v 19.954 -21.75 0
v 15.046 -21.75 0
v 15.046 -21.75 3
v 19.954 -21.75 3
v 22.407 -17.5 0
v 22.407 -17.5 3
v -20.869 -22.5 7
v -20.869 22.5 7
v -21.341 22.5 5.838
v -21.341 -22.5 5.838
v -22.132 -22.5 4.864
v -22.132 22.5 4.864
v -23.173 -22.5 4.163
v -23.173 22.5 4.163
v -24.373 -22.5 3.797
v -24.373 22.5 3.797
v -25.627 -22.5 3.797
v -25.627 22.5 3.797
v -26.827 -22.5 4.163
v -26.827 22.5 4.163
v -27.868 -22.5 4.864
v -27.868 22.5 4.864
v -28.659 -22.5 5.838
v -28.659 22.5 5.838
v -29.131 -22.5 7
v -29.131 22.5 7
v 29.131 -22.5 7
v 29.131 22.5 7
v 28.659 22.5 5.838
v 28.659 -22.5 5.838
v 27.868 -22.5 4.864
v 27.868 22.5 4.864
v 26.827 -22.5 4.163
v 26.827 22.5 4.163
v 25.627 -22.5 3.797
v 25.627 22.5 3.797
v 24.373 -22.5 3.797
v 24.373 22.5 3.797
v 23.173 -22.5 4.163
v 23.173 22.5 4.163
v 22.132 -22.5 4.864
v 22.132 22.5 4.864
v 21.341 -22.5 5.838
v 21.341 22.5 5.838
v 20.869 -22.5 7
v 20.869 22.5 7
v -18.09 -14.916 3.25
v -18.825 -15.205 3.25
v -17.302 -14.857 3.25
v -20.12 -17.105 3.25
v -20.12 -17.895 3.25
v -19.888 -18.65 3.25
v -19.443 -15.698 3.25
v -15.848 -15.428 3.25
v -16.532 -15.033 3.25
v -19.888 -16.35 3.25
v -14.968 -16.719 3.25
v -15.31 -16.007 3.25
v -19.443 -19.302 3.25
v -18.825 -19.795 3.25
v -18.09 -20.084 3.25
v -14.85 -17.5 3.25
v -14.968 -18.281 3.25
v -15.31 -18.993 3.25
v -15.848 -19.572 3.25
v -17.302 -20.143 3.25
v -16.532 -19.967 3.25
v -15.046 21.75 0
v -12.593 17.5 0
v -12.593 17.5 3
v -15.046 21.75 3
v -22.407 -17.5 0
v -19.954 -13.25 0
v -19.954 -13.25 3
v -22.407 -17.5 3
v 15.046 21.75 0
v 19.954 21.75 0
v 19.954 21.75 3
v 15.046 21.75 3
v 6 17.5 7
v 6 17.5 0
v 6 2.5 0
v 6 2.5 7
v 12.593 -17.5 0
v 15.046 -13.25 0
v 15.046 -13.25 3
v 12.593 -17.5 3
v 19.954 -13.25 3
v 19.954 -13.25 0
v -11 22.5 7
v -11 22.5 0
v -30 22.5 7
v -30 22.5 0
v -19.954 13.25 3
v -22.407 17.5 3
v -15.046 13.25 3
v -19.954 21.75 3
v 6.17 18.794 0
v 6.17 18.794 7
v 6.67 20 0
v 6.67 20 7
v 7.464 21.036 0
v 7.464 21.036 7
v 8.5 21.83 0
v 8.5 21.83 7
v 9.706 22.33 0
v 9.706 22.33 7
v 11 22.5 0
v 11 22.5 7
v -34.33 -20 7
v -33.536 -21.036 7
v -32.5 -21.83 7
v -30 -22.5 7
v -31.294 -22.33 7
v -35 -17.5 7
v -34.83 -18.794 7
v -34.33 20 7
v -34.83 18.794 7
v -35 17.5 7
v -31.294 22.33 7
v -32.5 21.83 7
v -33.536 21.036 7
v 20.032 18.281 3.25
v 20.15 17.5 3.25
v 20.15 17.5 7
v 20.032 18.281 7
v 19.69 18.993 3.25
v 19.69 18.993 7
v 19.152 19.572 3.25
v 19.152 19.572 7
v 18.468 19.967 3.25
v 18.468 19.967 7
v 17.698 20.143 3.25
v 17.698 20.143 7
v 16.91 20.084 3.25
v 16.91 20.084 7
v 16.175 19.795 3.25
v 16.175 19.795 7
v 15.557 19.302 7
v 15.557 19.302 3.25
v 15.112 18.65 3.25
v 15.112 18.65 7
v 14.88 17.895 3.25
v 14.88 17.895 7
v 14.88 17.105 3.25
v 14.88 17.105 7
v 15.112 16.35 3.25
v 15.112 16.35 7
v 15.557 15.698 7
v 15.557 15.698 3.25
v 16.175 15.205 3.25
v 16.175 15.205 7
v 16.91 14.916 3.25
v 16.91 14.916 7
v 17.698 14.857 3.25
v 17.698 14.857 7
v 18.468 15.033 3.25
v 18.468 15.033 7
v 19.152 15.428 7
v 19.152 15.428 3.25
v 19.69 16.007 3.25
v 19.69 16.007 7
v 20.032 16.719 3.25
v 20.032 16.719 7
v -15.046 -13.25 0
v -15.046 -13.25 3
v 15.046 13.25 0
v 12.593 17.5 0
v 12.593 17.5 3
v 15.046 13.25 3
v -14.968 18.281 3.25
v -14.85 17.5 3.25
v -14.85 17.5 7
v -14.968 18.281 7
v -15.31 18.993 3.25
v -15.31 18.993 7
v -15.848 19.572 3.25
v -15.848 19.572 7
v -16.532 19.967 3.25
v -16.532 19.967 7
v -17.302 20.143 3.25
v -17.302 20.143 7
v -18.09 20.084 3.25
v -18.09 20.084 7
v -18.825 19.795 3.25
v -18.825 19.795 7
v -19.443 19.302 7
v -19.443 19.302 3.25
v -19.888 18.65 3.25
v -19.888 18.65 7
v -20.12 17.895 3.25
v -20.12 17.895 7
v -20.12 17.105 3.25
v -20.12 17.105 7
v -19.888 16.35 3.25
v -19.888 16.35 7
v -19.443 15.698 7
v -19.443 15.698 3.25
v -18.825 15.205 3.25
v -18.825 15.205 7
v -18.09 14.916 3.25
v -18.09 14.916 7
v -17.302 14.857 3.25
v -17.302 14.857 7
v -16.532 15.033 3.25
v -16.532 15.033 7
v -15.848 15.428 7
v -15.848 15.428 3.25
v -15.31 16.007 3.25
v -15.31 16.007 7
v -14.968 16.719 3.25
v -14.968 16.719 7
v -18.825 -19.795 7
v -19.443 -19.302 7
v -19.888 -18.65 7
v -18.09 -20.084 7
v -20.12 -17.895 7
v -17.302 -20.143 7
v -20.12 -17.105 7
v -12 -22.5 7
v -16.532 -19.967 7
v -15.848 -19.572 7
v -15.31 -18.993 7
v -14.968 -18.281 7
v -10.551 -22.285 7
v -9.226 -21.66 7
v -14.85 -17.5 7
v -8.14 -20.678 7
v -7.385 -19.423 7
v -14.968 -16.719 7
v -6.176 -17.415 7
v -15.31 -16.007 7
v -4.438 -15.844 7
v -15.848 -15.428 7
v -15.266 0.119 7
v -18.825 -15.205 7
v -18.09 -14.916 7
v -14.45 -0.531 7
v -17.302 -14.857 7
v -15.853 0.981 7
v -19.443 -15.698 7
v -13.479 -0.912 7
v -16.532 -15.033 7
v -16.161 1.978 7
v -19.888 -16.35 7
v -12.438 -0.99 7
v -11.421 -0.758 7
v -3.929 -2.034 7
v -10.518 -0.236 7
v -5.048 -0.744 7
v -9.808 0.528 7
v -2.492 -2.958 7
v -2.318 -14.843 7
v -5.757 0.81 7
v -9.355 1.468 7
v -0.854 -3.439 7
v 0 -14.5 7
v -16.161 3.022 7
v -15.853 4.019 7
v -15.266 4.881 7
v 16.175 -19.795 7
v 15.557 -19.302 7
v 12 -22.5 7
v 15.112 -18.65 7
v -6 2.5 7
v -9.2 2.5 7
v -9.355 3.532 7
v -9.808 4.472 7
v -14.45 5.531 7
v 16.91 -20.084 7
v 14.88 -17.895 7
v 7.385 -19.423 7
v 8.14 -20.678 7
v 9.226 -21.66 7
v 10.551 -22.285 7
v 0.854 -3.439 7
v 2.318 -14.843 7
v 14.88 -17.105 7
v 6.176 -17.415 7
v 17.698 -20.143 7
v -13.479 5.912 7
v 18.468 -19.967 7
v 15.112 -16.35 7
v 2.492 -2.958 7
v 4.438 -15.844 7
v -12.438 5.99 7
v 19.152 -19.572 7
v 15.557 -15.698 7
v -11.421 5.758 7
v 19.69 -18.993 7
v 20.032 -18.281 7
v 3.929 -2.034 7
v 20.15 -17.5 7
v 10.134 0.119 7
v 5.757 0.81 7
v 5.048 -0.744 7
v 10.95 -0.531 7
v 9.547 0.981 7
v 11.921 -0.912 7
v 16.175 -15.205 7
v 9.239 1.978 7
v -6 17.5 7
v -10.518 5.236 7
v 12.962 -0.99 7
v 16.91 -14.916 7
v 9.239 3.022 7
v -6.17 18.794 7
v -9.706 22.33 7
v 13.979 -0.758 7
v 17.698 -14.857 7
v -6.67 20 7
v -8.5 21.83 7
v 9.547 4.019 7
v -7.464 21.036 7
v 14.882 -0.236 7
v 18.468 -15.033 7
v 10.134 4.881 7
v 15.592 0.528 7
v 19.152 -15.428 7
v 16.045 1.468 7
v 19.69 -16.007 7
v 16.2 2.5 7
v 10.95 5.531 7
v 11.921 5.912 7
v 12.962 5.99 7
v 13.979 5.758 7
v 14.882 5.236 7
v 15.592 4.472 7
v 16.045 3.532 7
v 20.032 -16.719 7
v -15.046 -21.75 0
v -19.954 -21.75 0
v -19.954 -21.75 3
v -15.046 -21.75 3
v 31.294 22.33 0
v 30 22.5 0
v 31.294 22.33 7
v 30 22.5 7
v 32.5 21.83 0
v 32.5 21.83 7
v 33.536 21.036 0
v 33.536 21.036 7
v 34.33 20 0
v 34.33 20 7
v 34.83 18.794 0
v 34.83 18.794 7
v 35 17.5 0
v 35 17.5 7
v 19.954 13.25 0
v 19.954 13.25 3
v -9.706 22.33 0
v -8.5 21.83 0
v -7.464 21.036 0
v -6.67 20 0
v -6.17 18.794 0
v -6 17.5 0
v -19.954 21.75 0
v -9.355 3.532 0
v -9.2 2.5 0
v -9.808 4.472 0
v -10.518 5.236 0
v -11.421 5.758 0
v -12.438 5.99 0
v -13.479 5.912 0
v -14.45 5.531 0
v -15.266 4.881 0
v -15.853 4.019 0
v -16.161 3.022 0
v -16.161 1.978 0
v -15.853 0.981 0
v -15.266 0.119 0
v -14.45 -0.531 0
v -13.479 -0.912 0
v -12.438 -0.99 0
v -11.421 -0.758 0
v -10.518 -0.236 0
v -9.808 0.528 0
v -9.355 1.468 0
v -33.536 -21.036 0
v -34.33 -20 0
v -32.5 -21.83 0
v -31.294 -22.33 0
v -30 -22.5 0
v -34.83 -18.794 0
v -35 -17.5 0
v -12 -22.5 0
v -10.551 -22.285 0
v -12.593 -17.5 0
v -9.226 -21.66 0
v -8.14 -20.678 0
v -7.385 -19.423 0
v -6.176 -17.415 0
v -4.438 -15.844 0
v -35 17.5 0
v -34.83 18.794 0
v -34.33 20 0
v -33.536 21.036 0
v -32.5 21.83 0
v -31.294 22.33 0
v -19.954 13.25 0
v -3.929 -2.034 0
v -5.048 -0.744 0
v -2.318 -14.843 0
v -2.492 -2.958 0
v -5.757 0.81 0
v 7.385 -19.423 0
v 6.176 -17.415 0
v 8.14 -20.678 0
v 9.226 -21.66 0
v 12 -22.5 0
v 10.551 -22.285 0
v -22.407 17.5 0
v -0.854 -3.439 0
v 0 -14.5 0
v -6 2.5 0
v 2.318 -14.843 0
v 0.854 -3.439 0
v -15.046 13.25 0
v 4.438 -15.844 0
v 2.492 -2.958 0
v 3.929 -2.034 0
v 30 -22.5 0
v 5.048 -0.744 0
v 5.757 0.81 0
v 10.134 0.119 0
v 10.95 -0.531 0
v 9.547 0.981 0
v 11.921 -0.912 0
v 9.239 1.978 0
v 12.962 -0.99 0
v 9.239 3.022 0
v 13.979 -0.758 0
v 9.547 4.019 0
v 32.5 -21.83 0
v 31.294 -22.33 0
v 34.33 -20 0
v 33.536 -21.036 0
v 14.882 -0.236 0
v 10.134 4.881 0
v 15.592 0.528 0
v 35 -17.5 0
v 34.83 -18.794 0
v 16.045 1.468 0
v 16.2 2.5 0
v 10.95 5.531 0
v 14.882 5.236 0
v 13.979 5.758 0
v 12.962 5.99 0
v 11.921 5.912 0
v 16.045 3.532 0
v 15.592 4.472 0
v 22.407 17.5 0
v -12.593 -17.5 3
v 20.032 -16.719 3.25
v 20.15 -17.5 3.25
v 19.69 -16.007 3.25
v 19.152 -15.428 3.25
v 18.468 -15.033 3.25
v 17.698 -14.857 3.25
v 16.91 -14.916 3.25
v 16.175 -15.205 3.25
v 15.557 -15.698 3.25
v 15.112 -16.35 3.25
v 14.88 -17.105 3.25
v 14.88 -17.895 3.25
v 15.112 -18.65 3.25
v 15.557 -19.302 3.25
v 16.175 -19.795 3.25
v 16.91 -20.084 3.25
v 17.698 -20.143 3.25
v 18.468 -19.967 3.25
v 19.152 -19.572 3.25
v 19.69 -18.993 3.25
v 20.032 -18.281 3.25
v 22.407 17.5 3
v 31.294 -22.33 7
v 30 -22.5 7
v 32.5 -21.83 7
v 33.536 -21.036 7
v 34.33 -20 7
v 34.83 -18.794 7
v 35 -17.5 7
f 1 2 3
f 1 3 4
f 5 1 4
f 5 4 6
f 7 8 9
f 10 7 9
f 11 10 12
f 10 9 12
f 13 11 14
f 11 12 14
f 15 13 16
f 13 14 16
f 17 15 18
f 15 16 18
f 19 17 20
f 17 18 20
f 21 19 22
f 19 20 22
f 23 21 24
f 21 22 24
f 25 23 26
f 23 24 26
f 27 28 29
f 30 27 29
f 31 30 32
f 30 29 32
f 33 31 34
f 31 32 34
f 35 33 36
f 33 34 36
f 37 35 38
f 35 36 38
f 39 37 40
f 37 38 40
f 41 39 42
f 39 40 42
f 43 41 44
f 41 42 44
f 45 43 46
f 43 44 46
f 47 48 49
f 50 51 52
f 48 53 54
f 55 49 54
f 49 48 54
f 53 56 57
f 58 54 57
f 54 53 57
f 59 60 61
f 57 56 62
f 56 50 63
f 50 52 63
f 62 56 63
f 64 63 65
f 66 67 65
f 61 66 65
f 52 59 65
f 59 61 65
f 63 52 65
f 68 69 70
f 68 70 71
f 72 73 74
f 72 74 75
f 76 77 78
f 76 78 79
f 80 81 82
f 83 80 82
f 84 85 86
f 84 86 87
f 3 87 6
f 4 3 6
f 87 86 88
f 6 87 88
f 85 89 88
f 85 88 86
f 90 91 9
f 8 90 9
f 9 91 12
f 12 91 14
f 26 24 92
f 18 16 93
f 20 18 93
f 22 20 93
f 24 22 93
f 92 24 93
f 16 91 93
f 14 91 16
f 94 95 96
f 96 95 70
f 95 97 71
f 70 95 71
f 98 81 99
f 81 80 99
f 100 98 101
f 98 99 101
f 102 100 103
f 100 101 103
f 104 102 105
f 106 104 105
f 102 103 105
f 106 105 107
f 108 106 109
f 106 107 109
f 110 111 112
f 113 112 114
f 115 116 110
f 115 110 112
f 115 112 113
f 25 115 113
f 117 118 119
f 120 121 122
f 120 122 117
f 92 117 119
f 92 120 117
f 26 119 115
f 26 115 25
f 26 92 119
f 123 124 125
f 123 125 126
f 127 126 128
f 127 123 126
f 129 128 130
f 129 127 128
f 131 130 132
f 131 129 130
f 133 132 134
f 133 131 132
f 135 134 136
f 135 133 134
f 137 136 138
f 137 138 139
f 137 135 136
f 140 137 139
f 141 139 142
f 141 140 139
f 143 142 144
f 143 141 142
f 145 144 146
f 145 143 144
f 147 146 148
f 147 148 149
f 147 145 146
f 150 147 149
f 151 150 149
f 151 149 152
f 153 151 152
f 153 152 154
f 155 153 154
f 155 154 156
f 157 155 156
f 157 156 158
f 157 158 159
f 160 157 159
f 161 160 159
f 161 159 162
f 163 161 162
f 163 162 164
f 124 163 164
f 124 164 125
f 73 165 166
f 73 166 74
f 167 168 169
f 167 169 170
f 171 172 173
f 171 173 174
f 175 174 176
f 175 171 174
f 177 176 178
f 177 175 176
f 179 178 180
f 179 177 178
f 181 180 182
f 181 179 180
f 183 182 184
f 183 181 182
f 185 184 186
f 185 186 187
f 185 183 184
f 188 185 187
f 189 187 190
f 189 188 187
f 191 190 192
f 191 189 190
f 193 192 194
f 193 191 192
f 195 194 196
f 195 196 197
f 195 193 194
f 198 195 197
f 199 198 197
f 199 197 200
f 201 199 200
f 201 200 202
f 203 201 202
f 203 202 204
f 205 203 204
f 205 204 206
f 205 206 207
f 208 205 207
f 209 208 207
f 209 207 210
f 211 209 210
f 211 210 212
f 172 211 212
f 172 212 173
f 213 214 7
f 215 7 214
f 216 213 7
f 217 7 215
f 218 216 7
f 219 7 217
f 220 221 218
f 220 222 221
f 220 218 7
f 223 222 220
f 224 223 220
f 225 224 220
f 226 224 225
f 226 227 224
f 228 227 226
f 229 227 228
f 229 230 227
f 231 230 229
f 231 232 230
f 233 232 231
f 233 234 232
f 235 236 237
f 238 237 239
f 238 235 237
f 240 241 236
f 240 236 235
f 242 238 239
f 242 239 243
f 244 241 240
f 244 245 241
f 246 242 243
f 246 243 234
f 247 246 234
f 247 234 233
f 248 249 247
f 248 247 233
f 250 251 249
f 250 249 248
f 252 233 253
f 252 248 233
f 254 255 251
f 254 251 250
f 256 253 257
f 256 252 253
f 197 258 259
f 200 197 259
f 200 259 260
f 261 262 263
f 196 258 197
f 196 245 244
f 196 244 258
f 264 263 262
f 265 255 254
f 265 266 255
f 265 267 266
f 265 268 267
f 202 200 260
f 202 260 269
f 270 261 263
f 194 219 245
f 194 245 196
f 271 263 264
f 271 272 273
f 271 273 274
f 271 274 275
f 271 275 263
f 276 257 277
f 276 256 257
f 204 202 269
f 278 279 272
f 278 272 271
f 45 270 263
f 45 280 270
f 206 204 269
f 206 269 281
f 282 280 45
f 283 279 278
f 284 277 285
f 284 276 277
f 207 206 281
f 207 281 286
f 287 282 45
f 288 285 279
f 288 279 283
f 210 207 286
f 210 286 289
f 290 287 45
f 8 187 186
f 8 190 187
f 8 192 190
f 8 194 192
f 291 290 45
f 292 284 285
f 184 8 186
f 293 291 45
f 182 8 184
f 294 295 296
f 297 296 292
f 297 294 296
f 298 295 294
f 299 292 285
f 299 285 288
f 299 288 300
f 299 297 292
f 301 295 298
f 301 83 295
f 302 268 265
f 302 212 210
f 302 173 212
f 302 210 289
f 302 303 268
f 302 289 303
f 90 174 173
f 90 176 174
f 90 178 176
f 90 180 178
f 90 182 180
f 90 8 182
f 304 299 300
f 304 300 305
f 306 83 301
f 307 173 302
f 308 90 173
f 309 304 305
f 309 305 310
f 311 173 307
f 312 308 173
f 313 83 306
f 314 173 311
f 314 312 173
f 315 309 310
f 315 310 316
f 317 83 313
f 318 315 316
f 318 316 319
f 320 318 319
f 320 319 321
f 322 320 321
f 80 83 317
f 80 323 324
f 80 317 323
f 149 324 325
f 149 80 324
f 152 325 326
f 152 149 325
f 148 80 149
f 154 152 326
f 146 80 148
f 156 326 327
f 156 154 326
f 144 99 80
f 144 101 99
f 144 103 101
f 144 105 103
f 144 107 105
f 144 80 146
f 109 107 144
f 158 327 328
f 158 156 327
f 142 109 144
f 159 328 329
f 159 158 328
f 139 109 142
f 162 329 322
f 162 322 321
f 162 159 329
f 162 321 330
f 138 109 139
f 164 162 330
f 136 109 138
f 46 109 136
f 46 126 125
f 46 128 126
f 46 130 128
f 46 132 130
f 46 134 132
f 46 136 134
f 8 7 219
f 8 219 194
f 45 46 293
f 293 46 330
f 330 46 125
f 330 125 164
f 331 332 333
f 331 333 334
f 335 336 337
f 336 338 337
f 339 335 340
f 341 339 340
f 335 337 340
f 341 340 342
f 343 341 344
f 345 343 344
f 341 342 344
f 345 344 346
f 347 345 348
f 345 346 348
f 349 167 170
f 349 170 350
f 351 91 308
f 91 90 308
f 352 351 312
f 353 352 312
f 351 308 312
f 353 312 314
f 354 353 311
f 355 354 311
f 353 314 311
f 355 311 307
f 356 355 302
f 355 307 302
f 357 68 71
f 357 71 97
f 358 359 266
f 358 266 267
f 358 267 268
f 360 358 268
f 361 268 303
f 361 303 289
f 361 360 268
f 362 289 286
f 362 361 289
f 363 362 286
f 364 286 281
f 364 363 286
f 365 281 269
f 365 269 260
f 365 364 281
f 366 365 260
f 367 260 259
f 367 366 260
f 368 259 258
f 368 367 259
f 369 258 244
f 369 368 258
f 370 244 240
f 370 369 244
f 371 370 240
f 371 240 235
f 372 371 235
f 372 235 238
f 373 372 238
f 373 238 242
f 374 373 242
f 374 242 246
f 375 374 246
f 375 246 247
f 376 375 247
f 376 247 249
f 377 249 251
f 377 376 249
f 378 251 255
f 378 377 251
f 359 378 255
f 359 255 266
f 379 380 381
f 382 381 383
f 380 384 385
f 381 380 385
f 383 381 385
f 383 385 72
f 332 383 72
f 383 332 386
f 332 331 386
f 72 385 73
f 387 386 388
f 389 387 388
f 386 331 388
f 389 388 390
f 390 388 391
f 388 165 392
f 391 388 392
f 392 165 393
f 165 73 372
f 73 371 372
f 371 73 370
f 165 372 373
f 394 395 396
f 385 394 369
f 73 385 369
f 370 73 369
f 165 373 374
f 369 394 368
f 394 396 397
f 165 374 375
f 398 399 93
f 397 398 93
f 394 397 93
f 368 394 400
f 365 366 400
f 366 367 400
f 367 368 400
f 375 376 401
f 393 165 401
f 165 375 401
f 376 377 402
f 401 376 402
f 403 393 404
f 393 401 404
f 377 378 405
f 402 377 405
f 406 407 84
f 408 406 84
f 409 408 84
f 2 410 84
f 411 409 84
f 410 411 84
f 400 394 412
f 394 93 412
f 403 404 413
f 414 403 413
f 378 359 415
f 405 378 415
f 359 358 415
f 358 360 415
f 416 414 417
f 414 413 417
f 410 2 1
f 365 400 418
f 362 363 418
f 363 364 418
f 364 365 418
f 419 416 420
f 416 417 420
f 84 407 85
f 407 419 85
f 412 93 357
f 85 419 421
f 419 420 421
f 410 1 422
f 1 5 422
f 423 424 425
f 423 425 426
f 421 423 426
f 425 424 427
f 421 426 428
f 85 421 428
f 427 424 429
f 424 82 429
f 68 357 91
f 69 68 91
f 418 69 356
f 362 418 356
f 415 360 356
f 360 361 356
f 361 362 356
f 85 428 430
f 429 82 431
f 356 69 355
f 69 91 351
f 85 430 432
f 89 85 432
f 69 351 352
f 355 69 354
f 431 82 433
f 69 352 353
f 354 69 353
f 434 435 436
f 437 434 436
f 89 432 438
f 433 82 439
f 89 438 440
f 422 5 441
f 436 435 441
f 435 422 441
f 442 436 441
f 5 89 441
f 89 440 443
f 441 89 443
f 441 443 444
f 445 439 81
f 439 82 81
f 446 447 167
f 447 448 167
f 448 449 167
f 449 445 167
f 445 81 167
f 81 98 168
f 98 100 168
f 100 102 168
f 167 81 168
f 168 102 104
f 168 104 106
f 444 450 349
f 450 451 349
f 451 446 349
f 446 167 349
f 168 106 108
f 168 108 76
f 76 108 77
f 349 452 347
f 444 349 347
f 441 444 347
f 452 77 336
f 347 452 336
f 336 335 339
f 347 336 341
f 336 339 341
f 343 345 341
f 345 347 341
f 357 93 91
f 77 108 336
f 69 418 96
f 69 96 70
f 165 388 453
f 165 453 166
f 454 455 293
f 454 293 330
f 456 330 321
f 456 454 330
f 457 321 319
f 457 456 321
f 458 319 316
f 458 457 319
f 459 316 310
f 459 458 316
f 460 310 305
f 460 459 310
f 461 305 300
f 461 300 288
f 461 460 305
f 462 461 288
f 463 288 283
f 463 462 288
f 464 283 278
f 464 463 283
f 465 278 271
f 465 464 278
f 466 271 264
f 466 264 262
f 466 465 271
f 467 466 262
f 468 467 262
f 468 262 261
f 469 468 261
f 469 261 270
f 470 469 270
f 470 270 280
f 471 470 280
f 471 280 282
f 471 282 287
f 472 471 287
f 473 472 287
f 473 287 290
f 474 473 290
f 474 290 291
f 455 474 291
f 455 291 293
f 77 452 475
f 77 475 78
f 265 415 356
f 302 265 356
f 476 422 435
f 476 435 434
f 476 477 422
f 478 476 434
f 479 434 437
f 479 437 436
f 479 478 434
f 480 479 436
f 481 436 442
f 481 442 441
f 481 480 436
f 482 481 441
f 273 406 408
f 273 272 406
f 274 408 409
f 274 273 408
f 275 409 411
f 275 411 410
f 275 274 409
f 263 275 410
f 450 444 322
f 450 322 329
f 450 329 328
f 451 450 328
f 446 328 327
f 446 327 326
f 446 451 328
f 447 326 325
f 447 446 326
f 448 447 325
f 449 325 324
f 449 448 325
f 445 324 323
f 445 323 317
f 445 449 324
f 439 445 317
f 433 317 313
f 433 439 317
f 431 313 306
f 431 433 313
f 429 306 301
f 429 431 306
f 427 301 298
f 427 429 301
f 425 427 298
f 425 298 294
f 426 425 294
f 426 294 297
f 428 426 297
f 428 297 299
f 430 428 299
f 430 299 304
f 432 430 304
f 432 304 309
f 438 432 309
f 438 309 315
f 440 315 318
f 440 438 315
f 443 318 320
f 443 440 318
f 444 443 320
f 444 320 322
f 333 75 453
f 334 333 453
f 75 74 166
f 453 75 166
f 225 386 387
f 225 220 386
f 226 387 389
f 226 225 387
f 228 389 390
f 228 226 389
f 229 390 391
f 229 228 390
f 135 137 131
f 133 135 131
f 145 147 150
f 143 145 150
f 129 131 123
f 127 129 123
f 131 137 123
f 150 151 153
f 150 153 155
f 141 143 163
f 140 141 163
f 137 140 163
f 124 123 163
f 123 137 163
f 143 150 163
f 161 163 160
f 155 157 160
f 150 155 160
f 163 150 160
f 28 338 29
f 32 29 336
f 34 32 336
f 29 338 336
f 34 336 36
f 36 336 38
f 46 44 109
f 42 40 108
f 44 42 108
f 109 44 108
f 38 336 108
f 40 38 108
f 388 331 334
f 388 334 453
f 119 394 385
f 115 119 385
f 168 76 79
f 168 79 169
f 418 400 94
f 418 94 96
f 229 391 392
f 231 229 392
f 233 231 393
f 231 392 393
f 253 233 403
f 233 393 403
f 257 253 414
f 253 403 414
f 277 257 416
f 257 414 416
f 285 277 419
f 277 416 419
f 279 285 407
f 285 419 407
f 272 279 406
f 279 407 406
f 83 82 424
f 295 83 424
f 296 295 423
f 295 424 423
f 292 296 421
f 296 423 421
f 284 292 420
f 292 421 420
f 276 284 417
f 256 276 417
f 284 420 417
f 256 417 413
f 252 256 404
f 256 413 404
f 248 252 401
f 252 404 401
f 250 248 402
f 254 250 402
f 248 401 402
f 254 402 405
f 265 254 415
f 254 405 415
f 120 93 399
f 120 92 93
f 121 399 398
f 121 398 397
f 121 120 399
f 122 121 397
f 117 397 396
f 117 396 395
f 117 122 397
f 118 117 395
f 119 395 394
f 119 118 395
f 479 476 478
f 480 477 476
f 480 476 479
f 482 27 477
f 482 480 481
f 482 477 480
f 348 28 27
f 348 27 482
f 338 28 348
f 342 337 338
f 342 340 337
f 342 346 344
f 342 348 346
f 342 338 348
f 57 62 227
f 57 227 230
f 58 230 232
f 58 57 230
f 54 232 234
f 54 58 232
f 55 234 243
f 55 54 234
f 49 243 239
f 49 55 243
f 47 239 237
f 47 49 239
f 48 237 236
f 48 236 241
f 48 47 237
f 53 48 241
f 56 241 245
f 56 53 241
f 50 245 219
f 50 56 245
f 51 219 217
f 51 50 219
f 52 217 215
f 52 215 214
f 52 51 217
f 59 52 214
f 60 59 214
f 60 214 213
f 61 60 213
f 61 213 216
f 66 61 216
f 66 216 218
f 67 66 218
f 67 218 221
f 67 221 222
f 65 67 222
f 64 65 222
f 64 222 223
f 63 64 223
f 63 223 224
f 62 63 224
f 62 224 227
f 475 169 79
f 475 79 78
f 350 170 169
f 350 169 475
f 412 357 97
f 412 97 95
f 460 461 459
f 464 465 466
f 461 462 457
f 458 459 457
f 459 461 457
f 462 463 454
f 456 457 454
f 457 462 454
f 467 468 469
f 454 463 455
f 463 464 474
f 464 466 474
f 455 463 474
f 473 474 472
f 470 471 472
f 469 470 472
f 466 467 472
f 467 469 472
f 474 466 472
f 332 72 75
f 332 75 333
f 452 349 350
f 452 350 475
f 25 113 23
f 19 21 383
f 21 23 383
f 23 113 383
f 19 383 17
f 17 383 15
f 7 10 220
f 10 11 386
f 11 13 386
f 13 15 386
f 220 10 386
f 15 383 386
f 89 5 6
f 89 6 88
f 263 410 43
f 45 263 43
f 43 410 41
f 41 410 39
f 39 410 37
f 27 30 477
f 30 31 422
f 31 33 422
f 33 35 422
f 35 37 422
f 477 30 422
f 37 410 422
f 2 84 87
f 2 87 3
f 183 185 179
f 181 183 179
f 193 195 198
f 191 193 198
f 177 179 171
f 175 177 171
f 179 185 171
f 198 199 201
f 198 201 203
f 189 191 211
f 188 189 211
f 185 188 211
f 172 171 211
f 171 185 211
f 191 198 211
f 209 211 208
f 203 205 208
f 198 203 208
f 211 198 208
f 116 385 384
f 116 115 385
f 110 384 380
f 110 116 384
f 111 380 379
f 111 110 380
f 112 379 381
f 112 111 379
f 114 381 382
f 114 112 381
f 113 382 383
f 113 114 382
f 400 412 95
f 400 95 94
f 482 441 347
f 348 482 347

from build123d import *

# Parameters (mm, degrees)
F0_R     = 3.5
F0_R_2   = 2.65
F1_DEPTH = 7
F2_DEPTH = 3
F3_R     = 4.25
F4_DEPTH = 45.001
F5_R     = 5
F7_R     = 2.65
F8_DEPTH = 0.25


with BuildPart() as f1:
    # F0 (on Top) → F1 (new body)
    with BuildSketch(Plane.XY):
        with BuildLine():
            Line((-6, 22.5), (-35, 22.5))
            Line((-35, 22.5), (-35, -22.5))
            Line((-35, -22.5), (-8, -22.5))
            ThreePointArc((-8, -22.5), (0, -14.5), (8, -22.5))
            Line((8, -22.5), (35, -22.5))
            Line((35, -22.5), (35, 22.5))
            Line((35, 22.5), (6, 22.5))
            Line((6, 22.5), (6, 2.5))
            ThreePointArc((6, 2.5), (0, -3.5), (-6, 2.5))
            Line((-6, 2.5), (-6, 22.5))
        make_face()
        Polygon((-22.4074772881, -17.5), (-19.9537386441, -13.25), (-15.0462613559, -13.25), (-12.5925227119, -17.5), (-15.0462613559, -21.75), (-19.9537386441, -21.75), align=None, mode=Mode.SUBTRACT)
        Polygon((12.5925227119, -17.5), (15.0462613559, -13.25), (19.9537386441, -13.25), (22.4074772881, -17.5), (19.9537386441, -21.75), (15.0462613559, -21.75), align=None, mode=Mode.SUBTRACT)
        with Locations((-12.7, 2.5)):
            Circle(F0_R, mode=Mode.SUBTRACT)
        Polygon((-12.5925227119, 17.5), (-15.0462613559, 13.25), (-19.9537386441, 13.25), (-22.4074772881, 17.5), (-19.9537386441, 21.75), (-15.0462613559, 21.75), align=None, mode=Mode.SUBTRACT)
        with Locations((12.7, 2.5)):
            Circle(F0_R, mode=Mode.SUBTRACT)
        Polygon((22.4074772881, 17.5), (19.9537386441, 13.25), (15.0462613559, 13.25), (12.5925227119, 17.5), (15.0462613559, 21.75), (19.9537386441, 21.75), align=None, mode=Mode.SUBTRACT)
        Polygon((-19.9537386441, 13.25), (-15.0462613559, 13.25), (-12.5925227119, 17.5), (-15.0462613559, 21.75), (-19.9537386441, 21.75), (-22.4074772881, 17.5), align=None)
        with Locations((-17.5, 17.5)):
            Circle(F0_R_2, mode=Mode.SUBTRACT)
        Polygon((-15.0462613559, -13.25), (-19.9537386441, -13.25), (-22.4074772881, -17.5), (-19.9537386441, -21.75), (-15.0462613559, -21.75), (-12.5925227119, -17.5), align=None)
        with Locations((-17.5, -17.5)):
            Circle(F0_R_2, mode=Mode.SUBTRACT)
        Polygon((19.9537386441, -13.25), (15.0462613559, -13.25), (12.5925227119, -17.5), (15.0462613559, -21.75), (19.9537386441, -21.75), (22.4074772881, -17.5), align=None)
        with Locations((17.5, -17.5)):
            Circle(F0_R_2, mode=Mode.SUBTRACT)
        Polygon((15.0462613559, 13.25), (19.9537386441, 13.25), (22.4074772881, 17.5), (19.9537386441, 21.75), (15.0462613559, 21.75), (12.5925227119, 17.5), align=None)
        with Locations((17.5, 17.5)):
            Circle(F0_R_2, mode=Mode.SUBTRACT)
    extrude(amount=F1_DEPTH)

    # F0 (on Top) → F2 (cut)
    with BuildSketch(Plane.XY):
        Polygon((19.9537386441, -13.25), (15.0462613559, -13.25), (12.5925227119, -17.5), (15.0462613559, -21.75), (19.9537386441, -21.75), (22.4074772881, -17.5), align=None)
        with Locations((17.5, -17.5)):
            Circle(F0_R_2, mode=Mode.SUBTRACT)
        Polygon((15.0462613559, 13.25), (19.9537386441, 13.25), (22.4074772881, 17.5), (19.9537386441, 21.75), (15.0462613559, 21.75), (12.5925227119, 17.5), align=None)
        with Locations((17.5, 17.5)):
            Circle(F0_R_2, mode=Mode.SUBTRACT)
        Polygon((-19.9537386441, 13.25), (-15.0462613559, 13.25), (-12.5925227119, 17.5), (-15.0462613559, 21.75), (-19.9537386441, 21.75), (-22.4074772881, 17.5), align=None)
        with Locations((-17.5, 17.5)):
            Circle(F0_R_2, mode=Mode.SUBTRACT)
        Polygon((-15.0462613559, -13.25), (-19.9537386441, -13.25), (-22.4074772881, -17.5), (-19.9537386441, -21.75), (-15.0462613559, -21.75), (-12.5925227119, -17.5), align=None)
        with Locations((-17.5, -17.5)):
            Circle(F0_R_2, mode=Mode.SUBTRACT)
    extrude(amount=F2_DEPTH, mode=Mode.SUBTRACT)

    # F3 (on face) → F4 (cut, through all)
    with BuildSketch(Plane(origin=(0, 22.5, 0), x_dir=(-1, 0, 0), z_dir=(0, 1, 0))):
        with Locations((-25, 8)):
            Circle(F3_R)
        with Locations((25, 8)):
            Circle(F3_R)
    extrude(amount=-F4_DEPTH, mode=Mode.SUBTRACT)

    # F5
    f5_edges = [f1.edges().sort_by_distance(p)[0] for p in [
        (35, 22.5, 3.5),
        (6, 22.5, 3.5),
        (-6, 22.5, 3.5),
        (-35, 22.5, 3.5),
        (-35, -22.5, 3.5),
        (35, -22.5, 3.5),
        (-8, -22.5, 3.5),
        (8, -22.5, 3.5),
    ]]
    fillet(f5_edges, radius=F5_R)

    # F7 (on offset) → F8 (join)
    with BuildSketch(Plane(origin=(0, 0, 3), x_dir=(1, 0, 0), z_dir=(0, 0, -1))):
        with Locations((17.5, -17.5)):
            Circle(F7_R)
        with Locations((17.5, 17.5)):
            Circle(F7_R)
        with Locations((-17.5, 17.5)):
            Circle(F7_R)
        with Locations((-17.5, -17.5)):
            Circle(F7_R)
    extrude(amount=-F8_DEPTH)


solid = f1.part
